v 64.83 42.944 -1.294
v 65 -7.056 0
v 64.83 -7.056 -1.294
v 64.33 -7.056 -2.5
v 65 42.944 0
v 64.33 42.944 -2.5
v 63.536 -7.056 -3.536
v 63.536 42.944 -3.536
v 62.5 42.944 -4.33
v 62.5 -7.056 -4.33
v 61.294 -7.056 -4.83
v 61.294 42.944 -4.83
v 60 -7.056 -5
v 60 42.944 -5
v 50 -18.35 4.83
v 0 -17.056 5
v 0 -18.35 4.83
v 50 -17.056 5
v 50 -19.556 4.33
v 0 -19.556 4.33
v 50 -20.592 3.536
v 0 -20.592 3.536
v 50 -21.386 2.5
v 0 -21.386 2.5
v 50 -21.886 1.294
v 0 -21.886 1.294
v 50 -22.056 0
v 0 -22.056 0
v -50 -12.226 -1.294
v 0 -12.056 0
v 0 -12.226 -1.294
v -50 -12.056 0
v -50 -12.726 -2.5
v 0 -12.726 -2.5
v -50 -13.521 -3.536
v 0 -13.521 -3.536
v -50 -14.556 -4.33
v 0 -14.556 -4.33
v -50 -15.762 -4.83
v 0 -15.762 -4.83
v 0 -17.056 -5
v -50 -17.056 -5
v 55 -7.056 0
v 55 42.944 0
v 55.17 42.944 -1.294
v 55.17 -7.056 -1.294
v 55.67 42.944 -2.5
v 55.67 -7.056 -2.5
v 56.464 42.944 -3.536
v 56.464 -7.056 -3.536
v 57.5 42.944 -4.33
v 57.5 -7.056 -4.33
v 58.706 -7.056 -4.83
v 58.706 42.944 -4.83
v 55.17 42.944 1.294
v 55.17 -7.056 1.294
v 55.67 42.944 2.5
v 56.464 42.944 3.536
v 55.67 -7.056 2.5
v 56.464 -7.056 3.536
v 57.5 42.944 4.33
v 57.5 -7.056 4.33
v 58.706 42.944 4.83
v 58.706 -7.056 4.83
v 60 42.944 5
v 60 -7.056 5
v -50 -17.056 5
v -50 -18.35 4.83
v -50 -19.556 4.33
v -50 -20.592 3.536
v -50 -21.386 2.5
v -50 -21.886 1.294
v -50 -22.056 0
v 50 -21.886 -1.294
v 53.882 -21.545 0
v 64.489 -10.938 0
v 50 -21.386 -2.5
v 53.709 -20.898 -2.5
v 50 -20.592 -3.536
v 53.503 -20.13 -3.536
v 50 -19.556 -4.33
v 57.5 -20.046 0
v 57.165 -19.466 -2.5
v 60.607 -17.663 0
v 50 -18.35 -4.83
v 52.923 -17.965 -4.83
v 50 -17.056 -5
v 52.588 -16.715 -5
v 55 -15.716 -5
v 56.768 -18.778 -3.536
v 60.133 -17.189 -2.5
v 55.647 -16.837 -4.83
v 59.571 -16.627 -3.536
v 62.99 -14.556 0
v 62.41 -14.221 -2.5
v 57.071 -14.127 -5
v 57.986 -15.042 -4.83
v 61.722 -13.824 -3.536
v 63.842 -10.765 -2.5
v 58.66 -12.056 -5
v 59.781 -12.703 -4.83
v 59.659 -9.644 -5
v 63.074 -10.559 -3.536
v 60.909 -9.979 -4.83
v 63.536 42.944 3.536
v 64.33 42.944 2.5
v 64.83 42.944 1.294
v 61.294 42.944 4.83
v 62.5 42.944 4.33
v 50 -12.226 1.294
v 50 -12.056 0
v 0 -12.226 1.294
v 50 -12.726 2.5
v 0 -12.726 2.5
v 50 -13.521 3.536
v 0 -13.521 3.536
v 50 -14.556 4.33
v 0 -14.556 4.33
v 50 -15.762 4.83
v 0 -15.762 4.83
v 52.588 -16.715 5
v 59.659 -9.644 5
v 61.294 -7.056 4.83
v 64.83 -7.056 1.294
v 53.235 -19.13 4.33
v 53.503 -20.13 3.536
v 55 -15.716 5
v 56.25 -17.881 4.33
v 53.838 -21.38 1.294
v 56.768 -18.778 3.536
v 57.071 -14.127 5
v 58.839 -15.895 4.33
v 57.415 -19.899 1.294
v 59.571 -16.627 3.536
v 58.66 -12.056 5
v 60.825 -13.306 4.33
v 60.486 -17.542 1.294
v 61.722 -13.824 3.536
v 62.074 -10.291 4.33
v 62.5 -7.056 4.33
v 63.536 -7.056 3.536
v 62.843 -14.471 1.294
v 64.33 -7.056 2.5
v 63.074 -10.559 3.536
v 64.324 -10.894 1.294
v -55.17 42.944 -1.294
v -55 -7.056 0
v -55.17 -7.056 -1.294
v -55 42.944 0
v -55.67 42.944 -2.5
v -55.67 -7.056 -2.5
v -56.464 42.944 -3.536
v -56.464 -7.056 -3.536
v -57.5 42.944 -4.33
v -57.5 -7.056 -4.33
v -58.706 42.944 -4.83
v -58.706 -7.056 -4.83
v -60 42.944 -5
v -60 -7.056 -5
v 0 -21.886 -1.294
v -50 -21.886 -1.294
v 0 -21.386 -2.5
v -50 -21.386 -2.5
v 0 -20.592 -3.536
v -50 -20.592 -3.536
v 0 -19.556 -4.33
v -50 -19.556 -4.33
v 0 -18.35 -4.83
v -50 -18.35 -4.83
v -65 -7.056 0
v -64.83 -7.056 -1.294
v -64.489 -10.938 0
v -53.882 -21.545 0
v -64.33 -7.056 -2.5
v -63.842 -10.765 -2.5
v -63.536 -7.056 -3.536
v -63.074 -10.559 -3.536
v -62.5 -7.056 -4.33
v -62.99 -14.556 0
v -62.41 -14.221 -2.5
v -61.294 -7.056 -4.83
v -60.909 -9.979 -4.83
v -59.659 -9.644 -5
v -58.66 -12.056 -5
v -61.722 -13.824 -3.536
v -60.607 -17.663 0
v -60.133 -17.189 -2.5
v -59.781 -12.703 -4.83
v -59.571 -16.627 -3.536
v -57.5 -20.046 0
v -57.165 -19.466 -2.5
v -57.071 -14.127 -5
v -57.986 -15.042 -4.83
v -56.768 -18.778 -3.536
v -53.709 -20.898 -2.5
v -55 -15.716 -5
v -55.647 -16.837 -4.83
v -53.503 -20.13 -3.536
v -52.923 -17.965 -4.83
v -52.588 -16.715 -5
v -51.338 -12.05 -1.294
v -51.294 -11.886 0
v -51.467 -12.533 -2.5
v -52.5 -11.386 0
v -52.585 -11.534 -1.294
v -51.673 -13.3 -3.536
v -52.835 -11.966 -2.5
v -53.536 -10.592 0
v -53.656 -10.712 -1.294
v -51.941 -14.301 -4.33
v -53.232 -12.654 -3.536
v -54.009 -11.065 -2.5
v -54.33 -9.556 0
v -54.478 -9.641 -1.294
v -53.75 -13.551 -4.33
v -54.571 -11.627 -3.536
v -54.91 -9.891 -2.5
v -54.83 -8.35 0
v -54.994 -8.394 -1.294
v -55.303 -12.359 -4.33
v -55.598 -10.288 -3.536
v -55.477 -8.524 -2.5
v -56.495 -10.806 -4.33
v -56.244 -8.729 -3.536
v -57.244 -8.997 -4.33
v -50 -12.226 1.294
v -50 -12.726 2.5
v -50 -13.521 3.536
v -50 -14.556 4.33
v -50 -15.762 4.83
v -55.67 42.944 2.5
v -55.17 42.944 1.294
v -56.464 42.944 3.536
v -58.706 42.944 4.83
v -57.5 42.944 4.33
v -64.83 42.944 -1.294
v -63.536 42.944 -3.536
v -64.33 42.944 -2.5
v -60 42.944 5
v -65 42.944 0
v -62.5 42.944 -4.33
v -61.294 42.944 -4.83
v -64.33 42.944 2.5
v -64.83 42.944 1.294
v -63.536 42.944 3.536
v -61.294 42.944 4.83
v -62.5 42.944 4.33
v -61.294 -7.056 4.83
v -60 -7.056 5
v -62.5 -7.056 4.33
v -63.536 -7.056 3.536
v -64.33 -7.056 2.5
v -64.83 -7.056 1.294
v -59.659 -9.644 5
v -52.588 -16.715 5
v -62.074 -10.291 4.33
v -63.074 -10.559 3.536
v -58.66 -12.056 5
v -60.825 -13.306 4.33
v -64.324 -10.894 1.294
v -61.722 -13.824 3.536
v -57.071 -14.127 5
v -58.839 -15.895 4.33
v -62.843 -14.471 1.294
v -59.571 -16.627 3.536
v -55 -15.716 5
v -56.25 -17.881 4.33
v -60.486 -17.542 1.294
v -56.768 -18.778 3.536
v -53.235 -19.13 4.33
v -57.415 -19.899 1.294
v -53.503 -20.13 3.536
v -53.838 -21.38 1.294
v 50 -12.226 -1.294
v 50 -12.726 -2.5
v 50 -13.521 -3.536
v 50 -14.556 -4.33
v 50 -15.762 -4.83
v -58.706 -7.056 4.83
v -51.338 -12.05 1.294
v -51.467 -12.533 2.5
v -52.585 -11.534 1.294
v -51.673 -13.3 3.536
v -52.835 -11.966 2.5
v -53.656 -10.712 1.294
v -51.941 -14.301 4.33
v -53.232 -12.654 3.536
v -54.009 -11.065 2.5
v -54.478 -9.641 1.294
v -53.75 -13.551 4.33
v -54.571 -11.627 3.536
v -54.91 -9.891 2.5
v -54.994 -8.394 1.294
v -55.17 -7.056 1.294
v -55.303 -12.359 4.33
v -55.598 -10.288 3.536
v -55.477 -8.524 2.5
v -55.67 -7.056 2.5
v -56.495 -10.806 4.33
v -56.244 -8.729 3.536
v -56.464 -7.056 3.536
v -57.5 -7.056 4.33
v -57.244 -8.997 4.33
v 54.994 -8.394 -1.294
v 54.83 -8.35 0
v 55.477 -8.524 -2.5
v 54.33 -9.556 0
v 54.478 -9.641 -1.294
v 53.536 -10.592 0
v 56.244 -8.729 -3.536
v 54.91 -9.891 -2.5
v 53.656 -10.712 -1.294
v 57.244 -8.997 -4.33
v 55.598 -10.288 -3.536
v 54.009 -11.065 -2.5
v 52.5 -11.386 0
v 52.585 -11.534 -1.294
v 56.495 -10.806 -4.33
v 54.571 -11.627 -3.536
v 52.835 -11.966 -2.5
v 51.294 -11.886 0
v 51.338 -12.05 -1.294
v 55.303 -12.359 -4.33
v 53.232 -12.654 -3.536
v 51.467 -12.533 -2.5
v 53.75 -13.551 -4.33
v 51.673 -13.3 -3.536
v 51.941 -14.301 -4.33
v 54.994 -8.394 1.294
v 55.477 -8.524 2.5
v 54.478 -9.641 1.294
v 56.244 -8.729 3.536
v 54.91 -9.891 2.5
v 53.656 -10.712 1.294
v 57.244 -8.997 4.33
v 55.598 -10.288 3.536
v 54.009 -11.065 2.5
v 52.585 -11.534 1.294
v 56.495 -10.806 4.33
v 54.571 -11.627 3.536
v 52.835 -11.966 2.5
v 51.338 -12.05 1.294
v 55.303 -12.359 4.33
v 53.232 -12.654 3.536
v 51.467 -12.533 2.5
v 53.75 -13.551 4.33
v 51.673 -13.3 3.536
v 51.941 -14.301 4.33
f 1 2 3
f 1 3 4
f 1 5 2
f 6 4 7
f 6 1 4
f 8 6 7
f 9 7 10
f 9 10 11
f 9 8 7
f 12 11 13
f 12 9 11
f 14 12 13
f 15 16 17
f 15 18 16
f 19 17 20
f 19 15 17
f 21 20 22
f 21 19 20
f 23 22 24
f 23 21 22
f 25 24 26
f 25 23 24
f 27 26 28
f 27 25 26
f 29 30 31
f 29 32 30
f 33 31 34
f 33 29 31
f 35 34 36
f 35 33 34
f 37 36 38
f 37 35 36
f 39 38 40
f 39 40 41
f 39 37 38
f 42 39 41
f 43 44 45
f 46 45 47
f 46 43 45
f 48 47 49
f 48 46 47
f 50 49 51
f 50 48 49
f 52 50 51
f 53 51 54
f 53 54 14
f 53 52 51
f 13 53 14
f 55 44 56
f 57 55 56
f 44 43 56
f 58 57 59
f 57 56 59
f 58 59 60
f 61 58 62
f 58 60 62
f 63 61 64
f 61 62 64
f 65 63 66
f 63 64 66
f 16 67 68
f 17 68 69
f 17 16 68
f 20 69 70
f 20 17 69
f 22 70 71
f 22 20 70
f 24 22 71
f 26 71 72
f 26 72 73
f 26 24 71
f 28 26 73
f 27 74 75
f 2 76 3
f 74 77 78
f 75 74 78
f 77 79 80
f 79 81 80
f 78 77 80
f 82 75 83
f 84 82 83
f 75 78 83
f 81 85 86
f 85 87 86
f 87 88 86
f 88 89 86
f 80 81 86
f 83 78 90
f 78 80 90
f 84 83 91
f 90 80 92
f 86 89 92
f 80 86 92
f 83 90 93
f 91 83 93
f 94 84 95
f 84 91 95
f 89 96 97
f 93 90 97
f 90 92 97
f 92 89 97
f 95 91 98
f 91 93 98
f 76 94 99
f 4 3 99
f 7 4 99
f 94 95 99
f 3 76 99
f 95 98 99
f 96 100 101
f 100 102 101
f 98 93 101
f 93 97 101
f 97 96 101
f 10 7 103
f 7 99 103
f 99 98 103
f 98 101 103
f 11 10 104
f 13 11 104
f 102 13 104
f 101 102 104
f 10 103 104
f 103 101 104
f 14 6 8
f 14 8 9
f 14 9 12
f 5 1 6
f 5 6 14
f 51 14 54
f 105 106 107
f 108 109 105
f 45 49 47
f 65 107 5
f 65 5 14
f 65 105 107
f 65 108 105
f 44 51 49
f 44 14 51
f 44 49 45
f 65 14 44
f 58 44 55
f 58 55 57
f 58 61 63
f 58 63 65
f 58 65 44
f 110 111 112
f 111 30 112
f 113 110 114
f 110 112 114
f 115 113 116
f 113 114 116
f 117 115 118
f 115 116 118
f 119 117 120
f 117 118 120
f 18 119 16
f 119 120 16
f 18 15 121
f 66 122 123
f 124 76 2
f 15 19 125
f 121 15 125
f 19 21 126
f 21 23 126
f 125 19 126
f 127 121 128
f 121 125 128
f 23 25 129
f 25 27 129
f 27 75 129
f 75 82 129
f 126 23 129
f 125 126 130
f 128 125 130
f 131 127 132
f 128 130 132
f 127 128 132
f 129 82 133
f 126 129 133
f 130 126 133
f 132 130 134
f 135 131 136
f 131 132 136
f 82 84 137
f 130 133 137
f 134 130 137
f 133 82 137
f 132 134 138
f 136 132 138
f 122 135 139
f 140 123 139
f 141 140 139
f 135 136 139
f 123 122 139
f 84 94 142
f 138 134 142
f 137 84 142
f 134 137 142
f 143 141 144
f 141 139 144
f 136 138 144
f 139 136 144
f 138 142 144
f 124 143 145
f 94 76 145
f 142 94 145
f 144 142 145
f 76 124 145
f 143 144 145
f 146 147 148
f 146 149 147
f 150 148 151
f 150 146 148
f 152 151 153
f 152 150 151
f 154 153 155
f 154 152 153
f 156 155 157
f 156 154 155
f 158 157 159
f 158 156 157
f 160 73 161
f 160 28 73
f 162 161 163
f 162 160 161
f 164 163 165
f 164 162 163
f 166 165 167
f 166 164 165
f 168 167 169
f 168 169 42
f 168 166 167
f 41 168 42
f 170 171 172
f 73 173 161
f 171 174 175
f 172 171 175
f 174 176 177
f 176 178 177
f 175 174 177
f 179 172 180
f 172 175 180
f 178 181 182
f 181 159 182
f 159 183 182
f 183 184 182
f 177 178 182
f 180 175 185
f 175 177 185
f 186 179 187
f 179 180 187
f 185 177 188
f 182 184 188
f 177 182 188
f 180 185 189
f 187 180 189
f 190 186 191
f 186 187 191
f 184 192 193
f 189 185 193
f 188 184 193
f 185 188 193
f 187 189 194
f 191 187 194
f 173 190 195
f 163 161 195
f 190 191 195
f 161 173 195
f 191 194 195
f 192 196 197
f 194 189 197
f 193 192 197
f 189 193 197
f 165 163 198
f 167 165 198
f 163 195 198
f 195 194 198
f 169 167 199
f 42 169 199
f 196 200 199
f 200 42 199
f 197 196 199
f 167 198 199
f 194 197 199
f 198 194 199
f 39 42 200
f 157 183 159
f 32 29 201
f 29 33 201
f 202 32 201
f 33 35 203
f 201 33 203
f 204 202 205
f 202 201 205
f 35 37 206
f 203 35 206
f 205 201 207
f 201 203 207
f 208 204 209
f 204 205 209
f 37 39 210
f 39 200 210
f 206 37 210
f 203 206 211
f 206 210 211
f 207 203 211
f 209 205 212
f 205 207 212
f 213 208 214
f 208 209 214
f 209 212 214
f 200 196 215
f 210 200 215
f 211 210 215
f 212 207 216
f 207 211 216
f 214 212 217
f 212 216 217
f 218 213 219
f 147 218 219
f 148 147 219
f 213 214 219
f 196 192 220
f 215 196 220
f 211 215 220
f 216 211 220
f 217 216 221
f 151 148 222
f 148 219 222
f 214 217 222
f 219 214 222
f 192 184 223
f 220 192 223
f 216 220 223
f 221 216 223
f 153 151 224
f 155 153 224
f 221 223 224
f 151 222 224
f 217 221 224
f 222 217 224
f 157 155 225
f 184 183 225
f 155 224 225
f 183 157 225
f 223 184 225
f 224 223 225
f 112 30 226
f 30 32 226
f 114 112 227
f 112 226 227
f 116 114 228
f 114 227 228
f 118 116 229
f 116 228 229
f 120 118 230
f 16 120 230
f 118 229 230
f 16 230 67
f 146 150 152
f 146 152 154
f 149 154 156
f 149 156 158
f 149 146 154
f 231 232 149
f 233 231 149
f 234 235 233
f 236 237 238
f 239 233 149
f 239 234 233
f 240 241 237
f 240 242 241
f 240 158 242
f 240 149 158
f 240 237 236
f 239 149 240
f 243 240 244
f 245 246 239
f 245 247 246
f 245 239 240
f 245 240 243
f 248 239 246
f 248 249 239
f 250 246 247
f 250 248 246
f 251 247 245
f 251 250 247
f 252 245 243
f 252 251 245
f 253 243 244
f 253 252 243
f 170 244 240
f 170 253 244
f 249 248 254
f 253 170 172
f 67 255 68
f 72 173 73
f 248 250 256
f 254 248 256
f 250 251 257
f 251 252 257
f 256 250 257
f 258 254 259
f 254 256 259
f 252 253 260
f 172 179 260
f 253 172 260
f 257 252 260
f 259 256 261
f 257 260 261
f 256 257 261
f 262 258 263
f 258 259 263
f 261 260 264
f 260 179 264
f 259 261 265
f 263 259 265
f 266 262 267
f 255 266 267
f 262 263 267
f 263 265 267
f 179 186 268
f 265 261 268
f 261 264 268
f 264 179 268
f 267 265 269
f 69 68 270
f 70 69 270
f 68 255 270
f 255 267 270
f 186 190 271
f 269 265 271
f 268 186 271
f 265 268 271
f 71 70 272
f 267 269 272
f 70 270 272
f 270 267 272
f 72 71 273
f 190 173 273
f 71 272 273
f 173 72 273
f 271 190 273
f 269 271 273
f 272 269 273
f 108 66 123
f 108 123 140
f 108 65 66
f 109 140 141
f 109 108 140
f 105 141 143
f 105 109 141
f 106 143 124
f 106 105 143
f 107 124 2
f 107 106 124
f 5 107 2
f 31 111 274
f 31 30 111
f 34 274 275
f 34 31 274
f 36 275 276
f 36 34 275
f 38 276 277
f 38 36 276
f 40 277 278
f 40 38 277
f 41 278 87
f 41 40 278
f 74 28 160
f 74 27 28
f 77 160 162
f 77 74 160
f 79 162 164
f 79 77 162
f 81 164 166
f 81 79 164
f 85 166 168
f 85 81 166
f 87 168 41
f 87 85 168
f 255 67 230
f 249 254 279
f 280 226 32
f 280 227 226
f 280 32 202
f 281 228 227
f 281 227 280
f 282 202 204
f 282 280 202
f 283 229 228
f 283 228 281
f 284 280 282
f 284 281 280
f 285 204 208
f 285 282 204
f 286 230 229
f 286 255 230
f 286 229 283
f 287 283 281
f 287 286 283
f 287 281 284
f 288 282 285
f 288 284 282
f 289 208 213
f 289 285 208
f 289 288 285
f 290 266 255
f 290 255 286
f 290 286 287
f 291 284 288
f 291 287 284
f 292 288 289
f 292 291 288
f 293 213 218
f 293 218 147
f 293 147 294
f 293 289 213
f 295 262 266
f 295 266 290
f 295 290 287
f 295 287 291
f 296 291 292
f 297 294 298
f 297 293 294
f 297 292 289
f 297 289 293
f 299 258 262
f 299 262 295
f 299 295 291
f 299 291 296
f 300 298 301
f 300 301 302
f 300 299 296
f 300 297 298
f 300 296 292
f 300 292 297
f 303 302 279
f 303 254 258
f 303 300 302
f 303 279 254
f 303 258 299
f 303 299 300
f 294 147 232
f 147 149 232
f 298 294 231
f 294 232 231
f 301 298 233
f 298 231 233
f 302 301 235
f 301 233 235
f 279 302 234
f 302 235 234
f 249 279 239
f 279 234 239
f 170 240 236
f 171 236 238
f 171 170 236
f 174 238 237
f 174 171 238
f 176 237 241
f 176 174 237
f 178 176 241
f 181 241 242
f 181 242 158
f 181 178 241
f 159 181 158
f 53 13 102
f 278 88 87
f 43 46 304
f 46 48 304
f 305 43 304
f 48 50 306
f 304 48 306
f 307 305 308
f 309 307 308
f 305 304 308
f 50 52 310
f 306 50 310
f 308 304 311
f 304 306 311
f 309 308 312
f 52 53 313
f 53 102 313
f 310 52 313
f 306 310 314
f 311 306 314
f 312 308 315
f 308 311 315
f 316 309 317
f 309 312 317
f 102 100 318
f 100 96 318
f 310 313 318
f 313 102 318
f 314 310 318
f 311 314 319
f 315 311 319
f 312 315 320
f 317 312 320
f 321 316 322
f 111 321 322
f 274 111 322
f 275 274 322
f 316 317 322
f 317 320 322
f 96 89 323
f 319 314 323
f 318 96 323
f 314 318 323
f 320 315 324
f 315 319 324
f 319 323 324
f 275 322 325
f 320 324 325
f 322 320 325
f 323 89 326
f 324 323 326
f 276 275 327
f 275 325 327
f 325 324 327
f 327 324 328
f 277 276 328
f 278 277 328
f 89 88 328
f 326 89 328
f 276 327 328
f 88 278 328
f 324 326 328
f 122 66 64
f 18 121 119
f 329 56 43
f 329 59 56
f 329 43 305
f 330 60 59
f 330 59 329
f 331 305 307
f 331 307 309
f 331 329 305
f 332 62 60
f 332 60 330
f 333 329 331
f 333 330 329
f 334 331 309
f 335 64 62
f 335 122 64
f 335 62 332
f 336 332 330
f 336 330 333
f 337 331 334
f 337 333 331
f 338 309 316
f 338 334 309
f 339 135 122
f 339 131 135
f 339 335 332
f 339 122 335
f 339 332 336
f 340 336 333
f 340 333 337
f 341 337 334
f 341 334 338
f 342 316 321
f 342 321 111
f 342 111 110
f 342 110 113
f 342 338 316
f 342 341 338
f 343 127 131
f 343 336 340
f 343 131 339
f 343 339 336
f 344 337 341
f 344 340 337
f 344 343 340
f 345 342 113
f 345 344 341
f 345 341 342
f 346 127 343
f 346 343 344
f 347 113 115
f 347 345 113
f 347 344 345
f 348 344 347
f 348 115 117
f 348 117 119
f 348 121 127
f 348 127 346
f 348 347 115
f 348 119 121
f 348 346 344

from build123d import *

# Parameters (mm, degrees)
F1_DEPTH = 5
F2_R     = 4.99999


# Not quite as in the source:
# - a fillet or chamfer is up to 0.001 mm smaller than in the source, because OpenCascade refuses the exact size
# - ends of sketch curves that miss each other by under 0.0002 mm in the source are joined


with BuildPart() as f1:
    # F0 (on Top) → F1 (new body, symmetric)
    with BuildSketch(Plane.XY):
        with BuildLine():
            Line((-55, 42.9439264748), (-65, 42.9439264748))
            Line((-65, 42.9439264748), (-65, -7.0560735252))
            ThreePointArc((-65, -7.0560735252), (-60.6066017178, -17.662675243), (-50, -22.0560735252))
            Line((-50, -22.0560735252), (0, -22.0560735252))
            Line((0, -22.0560735252), (50, -22.0560729504))
            ThreePointArc((50, -22.0560729504), (60.6066017178, -17.662675243), (65, -7.0560735252))
            Line((65, -7.0560735252), (65.000000149, 42.9439264748))
            Line((65.000000149, 42.9439264748), (55, 42.9439264748))
            Line((55, 42.9439264748), (55, -7.0560735252))
            ThreePointArc((55, -7.0560735252), (53.5355343776, -10.5916079028), (50, -12.0560741922))
            Line((50, -12.0560741922), (0, -12.0560735252))
            Line((0, -12.0560735252), (-50, -12.0560735252))
            ThreePointArc((-50, -12.0560735252), (-53.5355343776, -10.5916079028), (-55.000000667, -7.0560735252))
            Line((-55.000000667, -7.0560735252), (-55, 42.9439264748))
        make_face()
    extrude(amount=F1_DEPTH, both=True)

    # F2 (radius 5 in the source; OpenCascade refuses exactly that, so slightly less here)
    f2_edges = [f1.edges().sort_by_distance(p)[0] for p in [
        (-65, 17.943926, 5),
        (-65, -7.056074, 0),
        (-60.606602, -17.662675, -5),
        (-50, -22.056074, 0),
        (-60.606602, -17.662675, 5),
        (-25, -22.056074, -5),
        (0, -22.056074, 0),
        (-25, -22.056074, 5),
        (50, -22.056073, 0),
        (60.606602, -17.662675, -5),
        (65, -7.056074, 0),
        (60.606602, -17.662675, 5),
        (55, -7.056074, 0),
        (53.535534, -10.591608, -5),
        (50, -12.056074, 0),
        (53.535534, -10.591608, 5),
        (-25, -12.056074, -5),
        (-50, -12.056074, 0),
        (-25, -12.056074, 5),
        (0, -12.056074, 0),
        (-53.535534, -10.591608, -5),
        (-55.000001, -7.056074, 0),
        (-53.535534, -10.591608, 5),
    ]]
    fillet(f2_edges, radius=F2_R)


solid = f1.part
